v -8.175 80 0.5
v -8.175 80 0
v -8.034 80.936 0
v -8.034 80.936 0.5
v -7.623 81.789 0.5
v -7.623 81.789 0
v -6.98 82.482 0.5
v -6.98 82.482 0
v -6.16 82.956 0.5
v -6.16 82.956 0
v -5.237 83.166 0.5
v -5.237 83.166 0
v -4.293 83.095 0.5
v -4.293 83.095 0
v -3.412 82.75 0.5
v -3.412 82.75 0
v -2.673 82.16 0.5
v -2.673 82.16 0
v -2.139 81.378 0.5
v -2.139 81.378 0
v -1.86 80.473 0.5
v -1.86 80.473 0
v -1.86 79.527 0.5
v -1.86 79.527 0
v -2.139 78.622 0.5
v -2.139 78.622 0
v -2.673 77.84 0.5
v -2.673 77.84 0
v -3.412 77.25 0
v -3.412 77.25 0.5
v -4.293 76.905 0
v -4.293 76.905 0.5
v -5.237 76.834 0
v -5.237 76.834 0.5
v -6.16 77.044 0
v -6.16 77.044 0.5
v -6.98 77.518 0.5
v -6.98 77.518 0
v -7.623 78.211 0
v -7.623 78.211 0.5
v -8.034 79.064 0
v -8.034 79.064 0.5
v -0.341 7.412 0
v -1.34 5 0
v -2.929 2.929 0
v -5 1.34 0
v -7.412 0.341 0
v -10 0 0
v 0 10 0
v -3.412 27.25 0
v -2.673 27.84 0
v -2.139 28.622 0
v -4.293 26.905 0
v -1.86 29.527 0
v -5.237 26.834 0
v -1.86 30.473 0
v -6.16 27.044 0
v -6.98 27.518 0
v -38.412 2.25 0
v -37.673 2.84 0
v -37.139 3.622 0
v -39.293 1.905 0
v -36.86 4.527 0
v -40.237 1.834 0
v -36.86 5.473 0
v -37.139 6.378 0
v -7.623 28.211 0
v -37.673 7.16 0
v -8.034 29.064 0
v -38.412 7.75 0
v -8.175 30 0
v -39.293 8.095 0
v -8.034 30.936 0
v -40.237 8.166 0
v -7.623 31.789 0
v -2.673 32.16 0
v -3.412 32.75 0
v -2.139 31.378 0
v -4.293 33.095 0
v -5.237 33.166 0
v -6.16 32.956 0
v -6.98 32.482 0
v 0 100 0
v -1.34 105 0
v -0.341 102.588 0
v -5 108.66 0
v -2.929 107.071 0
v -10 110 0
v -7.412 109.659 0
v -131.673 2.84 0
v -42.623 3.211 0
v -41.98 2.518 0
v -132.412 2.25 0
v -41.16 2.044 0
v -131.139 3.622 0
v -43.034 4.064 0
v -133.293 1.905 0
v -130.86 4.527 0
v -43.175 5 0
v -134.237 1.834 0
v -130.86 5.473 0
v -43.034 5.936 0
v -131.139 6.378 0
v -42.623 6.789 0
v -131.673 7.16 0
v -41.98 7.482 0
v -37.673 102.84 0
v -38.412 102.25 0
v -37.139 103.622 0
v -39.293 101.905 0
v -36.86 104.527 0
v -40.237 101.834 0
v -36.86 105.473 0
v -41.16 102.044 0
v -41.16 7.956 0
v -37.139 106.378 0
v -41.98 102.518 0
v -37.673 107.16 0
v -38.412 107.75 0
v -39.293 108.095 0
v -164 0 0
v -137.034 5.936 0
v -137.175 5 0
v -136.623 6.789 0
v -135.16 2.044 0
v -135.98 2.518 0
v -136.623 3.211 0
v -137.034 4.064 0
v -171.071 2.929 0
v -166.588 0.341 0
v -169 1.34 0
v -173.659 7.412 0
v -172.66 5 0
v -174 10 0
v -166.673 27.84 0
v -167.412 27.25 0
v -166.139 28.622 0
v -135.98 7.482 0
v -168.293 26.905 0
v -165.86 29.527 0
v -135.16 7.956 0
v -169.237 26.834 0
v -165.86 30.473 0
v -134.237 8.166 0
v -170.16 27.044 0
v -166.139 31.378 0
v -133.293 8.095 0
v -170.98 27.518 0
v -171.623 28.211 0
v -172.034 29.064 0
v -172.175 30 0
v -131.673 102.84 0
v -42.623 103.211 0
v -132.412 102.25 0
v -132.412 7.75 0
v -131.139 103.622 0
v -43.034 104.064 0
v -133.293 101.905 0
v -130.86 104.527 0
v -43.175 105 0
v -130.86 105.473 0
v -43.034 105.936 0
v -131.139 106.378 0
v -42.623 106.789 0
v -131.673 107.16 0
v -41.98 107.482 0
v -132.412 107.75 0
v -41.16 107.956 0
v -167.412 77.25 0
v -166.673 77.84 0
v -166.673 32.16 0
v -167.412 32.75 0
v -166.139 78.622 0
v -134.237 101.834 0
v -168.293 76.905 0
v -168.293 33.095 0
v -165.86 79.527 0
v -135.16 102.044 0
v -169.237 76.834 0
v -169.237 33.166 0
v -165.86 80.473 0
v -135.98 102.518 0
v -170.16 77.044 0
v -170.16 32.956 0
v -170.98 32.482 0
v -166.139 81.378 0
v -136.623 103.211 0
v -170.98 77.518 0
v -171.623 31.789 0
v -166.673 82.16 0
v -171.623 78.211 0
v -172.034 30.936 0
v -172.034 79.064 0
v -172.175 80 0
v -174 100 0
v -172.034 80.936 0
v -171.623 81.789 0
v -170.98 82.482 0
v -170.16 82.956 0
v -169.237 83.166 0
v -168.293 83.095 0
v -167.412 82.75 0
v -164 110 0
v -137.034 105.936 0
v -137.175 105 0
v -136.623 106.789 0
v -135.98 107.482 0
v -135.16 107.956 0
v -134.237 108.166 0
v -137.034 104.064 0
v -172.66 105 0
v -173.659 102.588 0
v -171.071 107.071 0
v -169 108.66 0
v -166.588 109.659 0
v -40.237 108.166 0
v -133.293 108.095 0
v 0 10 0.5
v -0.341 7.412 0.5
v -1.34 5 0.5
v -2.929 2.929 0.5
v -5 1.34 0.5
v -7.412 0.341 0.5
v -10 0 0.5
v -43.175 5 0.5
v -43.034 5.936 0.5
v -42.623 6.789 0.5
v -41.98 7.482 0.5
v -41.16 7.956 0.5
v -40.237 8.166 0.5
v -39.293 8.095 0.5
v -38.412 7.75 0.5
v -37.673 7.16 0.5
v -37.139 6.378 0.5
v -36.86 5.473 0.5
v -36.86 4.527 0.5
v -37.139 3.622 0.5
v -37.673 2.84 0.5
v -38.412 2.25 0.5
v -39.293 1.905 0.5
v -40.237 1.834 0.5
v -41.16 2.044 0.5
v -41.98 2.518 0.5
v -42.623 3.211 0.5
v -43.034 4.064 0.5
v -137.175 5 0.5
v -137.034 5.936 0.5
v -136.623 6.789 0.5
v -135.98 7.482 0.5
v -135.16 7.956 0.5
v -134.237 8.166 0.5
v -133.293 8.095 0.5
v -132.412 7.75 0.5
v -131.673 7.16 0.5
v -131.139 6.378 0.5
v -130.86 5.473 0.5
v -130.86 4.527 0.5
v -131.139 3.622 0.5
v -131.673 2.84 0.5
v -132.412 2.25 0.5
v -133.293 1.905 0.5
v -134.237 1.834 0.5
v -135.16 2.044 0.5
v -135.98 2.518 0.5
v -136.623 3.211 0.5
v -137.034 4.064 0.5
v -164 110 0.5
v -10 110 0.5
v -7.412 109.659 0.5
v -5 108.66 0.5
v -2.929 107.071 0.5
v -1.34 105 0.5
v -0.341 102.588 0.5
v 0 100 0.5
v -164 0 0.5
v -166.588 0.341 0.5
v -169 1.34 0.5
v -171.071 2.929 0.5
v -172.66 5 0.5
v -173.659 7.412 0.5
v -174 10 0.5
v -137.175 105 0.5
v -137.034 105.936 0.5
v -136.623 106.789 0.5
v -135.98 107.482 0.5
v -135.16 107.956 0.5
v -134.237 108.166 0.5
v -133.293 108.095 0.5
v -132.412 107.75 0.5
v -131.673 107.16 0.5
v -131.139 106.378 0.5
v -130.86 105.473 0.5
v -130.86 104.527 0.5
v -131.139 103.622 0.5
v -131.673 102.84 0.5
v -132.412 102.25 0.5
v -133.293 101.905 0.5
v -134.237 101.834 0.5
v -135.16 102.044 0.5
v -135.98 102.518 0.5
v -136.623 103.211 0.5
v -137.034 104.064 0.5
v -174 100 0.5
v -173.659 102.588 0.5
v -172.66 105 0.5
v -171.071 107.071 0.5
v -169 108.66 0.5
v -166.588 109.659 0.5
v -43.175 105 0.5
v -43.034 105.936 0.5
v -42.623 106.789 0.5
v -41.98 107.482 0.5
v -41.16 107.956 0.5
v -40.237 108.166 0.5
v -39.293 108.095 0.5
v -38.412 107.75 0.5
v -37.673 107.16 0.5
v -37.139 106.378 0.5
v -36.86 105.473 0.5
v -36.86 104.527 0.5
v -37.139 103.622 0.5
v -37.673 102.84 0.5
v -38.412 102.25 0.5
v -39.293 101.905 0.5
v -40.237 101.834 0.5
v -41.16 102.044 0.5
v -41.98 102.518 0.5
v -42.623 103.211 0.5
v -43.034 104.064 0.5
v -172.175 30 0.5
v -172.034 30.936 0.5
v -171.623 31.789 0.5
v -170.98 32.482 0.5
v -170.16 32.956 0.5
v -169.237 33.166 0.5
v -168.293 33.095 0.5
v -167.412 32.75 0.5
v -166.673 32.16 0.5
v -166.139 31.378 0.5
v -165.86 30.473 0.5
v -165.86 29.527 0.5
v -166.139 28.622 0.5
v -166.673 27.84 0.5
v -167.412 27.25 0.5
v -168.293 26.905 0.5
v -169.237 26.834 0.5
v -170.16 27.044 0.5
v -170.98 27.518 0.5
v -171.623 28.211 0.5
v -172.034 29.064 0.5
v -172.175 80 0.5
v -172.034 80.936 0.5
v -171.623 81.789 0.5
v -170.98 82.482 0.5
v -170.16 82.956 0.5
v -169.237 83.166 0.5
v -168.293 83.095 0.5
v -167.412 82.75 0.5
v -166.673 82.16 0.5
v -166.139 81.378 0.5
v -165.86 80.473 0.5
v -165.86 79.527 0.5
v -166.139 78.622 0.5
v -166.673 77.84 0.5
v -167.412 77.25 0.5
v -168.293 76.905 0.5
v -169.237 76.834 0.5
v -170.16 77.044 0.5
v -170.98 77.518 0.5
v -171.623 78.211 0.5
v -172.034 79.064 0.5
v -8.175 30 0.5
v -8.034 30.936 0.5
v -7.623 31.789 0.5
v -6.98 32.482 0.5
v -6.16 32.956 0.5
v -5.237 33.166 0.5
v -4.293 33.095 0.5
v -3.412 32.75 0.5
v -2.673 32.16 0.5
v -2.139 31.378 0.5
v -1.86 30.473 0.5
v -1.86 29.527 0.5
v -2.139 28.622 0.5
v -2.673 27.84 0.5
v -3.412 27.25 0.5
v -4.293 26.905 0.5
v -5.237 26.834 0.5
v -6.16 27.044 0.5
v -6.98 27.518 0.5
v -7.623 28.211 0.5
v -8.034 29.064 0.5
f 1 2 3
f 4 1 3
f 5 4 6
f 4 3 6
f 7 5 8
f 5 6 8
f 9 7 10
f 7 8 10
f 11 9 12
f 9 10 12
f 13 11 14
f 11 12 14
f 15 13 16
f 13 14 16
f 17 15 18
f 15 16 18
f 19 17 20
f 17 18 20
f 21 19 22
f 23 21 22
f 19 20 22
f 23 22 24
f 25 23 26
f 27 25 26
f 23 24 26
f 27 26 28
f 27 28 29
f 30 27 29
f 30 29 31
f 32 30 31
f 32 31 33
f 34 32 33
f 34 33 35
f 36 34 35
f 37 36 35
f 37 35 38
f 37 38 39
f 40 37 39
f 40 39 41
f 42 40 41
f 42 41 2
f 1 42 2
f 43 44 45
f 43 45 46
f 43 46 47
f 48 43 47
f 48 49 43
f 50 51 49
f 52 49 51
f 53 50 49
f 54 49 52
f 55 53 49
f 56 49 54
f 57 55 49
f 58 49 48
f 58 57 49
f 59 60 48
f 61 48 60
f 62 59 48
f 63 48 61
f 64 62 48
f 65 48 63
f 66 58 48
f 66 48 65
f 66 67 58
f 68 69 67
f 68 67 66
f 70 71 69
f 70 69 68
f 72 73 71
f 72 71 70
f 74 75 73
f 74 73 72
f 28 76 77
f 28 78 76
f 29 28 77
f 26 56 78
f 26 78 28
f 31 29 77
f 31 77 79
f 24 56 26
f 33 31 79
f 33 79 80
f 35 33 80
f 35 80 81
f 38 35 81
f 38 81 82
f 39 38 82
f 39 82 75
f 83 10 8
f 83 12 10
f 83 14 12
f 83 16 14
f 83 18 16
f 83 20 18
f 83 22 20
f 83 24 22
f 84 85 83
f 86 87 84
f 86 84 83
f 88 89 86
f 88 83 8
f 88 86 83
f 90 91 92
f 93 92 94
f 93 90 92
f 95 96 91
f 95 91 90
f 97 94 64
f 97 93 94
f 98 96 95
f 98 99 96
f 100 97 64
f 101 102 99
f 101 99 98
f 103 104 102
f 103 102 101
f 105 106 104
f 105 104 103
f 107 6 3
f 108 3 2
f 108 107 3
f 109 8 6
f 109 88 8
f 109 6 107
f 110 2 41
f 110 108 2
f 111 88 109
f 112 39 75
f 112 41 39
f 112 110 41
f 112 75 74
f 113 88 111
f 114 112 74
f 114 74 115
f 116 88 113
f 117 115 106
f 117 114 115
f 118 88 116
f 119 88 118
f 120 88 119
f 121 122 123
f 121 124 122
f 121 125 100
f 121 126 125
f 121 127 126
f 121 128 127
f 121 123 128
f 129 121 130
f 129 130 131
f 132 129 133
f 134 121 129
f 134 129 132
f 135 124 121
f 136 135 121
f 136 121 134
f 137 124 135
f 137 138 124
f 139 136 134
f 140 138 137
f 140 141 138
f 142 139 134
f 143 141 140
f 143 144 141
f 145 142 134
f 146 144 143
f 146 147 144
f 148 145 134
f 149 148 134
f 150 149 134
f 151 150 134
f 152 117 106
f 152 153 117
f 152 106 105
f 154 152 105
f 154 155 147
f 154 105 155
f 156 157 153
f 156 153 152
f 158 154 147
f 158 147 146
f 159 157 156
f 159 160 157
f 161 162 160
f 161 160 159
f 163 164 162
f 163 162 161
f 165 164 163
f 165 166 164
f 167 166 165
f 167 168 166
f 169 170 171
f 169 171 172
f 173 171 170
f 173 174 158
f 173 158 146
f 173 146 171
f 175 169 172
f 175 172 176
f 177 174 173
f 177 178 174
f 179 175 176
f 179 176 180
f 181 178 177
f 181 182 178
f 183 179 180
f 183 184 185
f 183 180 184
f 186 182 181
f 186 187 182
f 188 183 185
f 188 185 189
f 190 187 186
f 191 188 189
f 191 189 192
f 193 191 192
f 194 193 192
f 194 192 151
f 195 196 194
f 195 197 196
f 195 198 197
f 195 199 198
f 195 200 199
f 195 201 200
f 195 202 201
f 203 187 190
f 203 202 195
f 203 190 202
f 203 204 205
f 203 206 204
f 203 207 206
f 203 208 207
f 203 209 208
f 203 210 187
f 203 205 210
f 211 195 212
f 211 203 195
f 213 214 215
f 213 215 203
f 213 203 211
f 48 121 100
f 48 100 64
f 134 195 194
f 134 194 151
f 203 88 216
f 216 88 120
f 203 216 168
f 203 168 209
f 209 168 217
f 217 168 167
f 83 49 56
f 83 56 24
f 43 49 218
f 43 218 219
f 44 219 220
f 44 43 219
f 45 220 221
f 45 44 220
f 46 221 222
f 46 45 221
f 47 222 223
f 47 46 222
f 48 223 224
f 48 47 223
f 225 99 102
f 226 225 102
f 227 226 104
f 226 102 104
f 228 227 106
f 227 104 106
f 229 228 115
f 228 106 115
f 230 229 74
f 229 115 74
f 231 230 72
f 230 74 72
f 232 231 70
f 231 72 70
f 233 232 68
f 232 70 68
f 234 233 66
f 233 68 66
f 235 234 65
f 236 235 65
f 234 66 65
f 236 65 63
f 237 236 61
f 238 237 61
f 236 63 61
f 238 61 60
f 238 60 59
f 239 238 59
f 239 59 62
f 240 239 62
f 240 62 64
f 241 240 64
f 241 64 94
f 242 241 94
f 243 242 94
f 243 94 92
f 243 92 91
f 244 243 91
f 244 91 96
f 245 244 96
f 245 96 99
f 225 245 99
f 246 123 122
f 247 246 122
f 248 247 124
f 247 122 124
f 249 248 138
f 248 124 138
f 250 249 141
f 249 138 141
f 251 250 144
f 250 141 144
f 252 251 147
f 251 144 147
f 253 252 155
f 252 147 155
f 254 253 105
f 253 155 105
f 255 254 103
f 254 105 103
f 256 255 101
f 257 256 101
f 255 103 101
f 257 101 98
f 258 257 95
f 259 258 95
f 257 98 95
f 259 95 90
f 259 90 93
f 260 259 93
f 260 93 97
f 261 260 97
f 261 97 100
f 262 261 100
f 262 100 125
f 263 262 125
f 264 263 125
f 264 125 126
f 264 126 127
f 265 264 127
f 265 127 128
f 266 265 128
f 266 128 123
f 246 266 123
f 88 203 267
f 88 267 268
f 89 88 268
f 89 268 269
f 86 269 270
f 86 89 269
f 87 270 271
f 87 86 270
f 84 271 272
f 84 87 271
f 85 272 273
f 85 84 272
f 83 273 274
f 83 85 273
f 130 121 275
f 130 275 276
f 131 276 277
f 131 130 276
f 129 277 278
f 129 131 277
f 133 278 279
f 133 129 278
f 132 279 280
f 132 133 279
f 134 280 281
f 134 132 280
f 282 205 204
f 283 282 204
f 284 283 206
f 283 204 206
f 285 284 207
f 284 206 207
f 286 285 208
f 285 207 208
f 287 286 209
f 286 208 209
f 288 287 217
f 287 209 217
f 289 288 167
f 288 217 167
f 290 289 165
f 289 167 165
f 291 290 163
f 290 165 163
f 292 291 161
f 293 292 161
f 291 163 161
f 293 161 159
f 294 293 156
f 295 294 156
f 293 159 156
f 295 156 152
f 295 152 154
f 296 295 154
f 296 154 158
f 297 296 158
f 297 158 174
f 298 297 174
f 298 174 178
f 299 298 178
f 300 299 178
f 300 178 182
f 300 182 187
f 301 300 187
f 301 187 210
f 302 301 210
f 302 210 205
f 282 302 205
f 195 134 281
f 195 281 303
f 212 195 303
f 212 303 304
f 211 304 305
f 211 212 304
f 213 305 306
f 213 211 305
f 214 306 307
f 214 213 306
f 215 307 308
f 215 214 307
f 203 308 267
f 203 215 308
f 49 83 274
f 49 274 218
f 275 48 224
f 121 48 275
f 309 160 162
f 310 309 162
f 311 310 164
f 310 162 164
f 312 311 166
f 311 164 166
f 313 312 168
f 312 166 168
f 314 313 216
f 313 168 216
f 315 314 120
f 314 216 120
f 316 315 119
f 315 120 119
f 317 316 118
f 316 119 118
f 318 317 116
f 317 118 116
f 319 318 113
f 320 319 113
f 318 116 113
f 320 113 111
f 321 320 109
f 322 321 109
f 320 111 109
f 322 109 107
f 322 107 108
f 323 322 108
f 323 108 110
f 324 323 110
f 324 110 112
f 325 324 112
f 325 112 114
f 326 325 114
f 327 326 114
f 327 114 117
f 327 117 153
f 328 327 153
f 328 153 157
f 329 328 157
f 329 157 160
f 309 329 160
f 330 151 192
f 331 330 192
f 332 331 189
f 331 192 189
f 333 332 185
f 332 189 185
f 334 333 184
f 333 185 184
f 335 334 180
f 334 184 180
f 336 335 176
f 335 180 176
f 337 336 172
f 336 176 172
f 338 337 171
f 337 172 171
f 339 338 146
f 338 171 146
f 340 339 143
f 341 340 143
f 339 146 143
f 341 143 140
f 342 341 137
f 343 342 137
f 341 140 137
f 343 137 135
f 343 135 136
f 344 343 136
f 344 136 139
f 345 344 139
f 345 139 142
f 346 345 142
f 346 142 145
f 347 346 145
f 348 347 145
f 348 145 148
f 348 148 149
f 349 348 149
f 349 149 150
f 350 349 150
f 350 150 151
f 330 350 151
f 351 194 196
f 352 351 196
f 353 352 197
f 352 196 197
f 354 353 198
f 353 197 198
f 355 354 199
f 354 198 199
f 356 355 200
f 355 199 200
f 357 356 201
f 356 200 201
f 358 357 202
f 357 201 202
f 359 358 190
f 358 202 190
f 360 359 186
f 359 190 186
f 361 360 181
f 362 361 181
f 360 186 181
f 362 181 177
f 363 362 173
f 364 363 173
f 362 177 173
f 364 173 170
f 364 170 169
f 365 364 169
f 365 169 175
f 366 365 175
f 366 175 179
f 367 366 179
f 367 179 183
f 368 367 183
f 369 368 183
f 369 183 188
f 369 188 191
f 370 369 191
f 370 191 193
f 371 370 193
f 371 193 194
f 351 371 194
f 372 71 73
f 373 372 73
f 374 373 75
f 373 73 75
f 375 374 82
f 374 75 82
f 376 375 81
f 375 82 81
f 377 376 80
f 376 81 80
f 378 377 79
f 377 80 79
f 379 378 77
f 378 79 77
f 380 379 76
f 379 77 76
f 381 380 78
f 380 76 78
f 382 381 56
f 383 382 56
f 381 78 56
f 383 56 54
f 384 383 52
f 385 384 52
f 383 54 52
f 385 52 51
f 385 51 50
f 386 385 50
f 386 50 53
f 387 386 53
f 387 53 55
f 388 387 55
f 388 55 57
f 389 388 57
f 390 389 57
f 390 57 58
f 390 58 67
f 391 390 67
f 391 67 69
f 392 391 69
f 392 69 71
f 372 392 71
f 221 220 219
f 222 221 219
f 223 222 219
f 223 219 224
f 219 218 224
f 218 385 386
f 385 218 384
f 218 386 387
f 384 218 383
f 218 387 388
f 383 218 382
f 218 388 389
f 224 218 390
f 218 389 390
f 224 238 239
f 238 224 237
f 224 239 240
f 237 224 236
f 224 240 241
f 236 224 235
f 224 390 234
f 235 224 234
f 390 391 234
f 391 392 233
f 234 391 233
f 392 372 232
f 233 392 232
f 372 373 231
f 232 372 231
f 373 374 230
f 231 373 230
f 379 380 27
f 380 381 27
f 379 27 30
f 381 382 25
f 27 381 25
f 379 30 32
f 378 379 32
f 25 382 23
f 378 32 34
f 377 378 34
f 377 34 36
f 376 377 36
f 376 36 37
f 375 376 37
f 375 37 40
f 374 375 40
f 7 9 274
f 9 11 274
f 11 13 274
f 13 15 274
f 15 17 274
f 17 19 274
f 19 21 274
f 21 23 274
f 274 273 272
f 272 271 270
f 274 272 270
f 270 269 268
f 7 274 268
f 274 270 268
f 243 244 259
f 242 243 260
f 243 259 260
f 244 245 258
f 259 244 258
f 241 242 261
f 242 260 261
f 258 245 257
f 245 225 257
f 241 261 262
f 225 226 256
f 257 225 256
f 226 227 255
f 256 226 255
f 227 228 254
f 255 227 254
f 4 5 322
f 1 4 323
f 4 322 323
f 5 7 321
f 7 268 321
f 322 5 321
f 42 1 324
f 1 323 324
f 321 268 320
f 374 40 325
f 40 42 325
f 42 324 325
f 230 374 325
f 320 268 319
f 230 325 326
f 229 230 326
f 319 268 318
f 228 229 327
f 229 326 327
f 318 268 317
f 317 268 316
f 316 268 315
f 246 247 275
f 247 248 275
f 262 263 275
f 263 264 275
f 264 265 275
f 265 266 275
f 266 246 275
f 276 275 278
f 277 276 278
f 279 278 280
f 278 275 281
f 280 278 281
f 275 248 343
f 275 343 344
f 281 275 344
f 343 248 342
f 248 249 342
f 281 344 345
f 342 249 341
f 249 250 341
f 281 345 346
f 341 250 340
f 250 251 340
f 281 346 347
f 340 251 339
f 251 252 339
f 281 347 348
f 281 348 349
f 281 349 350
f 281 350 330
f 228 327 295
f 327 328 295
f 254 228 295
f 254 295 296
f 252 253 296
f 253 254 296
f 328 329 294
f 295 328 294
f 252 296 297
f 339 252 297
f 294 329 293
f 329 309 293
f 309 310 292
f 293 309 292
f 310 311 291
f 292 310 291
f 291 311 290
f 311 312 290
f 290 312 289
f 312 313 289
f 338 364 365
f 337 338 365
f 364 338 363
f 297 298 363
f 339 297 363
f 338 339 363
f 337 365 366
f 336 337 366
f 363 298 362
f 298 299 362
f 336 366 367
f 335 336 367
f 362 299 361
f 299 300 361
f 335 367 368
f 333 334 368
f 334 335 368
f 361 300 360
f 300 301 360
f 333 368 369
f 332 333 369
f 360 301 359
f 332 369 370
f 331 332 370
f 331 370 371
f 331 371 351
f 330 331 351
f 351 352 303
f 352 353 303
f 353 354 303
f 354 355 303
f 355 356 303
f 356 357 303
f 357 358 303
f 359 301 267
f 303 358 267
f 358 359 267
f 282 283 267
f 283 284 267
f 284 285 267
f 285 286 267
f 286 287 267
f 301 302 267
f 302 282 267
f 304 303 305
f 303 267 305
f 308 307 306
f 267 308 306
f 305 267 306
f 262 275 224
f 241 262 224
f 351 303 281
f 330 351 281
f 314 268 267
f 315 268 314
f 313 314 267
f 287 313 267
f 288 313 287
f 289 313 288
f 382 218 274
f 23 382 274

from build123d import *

# Parameters (mm, degrees)
RESSALTO_EXTRUS_O1_DEPTH                       = 0.5
BROCA_DE_ROSQUEAR_PARA_TARRAXA_DE_M3X0_5_D     = 6.35
BROCA_DE_ROSQUEAR_PARA_TARRAXA_DE_M3X0_5_DEPTH = 23.492267535
BROCA_DE_ROSQUEAR_PARA_TARRAXA_DE_M3X0_5_TIP   = 1.907732465


with BuildPart() as part:
    # Esboço1 → Ressalto-extrusão1 (new body)
    with BuildSketch(Plane.XY):
        with BuildLine():
            Line((-10, 0), (-164, 0))
            ThreePointArc((-164, 0), (-171.071067812, 2.928932188), (-174, 10))
            Line((-174, 10), (-174, 100))
            ThreePointArc((-174, 100), (-171.071067812, 107.071067812), (-164, 110))
            Line((-164, 110), (-10, 110))
            ThreePointArc((-10, 110), (-2.928932188, 107.071067812), (0, 100))
            Line((0, 100), (0, 10))
            ThreePointArc((0, 10), (-2.928932188, 2.928932188), (-10, 0))
        make_face()
    extrude(amount=RESSALTO_EXTRUS_O1_DEPTH)

    # Broca de rosquear para tarraxa de M3x0.51
    with Locations(Plane.XY.offset(0.5)):
        with Locations((-169, 80), (-134, 105), (-40, 105), (-5, 80), (-5, 30), (-169, 30), (-134, 5), (-40, 5)):
            Hole(BROCA_DE_ROSQUEAR_PARA_TARRAXA_DE_M3X0_5_D / 2, depth=BROCA_DE_ROSQUEAR_PARA_TARRAXA_DE_M3X0_5_DEPTH)
            with Locations((0, 0, -(BROCA_DE_ROSQUEAR_PARA_TARRAXA_DE_M3X0_5_DEPTH + BROCA_DE_ROSQUEAR_PARA_TARRAXA_DE_M3X0_5_TIP / 2))):  # 118° drill point
                Cone(0, BROCA_DE_ROSQUEAR_PARA_TARRAXA_DE_M3X0_5_D / 2, BROCA_DE_ROSQUEAR_PARA_TARRAXA_DE_M3X0_5_TIP, mode=Mode.SUBTRACT)


solid = part.part
